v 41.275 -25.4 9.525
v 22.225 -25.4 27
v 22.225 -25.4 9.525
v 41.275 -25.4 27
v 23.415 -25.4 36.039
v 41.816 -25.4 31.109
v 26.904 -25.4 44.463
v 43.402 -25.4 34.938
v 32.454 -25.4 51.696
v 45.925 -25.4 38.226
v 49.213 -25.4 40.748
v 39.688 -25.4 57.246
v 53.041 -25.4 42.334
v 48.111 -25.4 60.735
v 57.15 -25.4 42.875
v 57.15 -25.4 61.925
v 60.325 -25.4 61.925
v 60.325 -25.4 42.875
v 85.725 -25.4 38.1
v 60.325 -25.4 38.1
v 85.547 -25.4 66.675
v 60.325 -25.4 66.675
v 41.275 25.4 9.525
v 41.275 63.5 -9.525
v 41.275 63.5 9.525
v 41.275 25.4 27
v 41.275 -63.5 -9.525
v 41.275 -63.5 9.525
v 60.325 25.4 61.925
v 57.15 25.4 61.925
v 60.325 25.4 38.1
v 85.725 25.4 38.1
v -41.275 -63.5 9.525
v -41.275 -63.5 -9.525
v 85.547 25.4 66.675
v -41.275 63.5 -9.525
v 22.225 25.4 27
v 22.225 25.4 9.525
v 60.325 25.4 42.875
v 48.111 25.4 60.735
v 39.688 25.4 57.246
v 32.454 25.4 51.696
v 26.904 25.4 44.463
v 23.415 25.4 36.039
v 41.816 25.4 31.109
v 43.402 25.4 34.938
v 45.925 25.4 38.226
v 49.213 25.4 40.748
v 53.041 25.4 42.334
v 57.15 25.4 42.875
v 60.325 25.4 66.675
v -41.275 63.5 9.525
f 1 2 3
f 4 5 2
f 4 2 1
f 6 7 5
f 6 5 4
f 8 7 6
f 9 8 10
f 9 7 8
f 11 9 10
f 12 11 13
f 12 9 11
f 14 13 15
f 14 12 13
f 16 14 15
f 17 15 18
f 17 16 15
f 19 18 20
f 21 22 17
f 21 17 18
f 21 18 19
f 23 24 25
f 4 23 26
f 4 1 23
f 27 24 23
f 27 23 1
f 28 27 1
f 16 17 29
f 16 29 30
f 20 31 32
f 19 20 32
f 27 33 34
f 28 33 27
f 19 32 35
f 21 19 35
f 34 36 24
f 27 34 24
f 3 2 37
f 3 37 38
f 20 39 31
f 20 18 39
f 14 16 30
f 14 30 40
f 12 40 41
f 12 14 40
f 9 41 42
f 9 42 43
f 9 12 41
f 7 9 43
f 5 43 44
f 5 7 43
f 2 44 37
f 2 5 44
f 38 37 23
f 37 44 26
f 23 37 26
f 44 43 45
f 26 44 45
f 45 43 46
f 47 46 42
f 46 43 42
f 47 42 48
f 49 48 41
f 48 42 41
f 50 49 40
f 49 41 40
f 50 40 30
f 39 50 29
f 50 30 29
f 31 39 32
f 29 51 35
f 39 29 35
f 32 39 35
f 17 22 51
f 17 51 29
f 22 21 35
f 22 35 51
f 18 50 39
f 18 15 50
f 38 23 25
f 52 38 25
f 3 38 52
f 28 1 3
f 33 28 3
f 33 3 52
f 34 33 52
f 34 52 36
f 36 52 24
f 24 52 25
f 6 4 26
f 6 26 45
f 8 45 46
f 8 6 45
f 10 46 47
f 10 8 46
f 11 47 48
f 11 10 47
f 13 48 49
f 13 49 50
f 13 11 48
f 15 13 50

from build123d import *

# Parameters (mm, degrees)
F1_DEPTH = 63.5
F2_DEPTH = 25.4


with BuildPart() as f1:
    # F0 (on Front) → F1 (new body, symmetric)
    with BuildSketch(Plane.XZ):
        Polygon((41.275, -9.525), (41.275, 9.525), (22.225, 9.525), (-41.275, 9.525), (-41.275, -9.525), align=None)
    extrude(amount=F1_DEPTH, both=True)

    # F0 (on Front) → F2 (join, symmetric)
    with BuildSketch(Plane.XZ):
        Polygon((60.325, 61.9252), (60.325, 42.8752), (60.325, 38.1), (85.725, 38.1), (85.547439, 66.675), (60.325, 66.675), align=None)
        with BuildLine():
            Line((22.225, 9.525), (41.275, 9.525))
            Line((41.275, 9.525), (41.275, 27.0002))
            ThreePointArc((41.275, 27.0002), (45.92468, 38.22552), (57.15, 42.8752))
            Line((57.15, 42.8752), (60.325, 42.8752))
            Line((60.325, 42.8752), (60.325, 61.9252))
            Line((60.325, 61.9252), (57.15, 61.9252))
            ThreePointArc((57.15, 61.9252), (32.454296, 51.695904), (22.225, 27.0002))
            Line((22.225, 27.0002), (22.225, 9.525))
        make_face()
    extrude(amount=F2_DEPTH, both=True)


solid = f1.part
